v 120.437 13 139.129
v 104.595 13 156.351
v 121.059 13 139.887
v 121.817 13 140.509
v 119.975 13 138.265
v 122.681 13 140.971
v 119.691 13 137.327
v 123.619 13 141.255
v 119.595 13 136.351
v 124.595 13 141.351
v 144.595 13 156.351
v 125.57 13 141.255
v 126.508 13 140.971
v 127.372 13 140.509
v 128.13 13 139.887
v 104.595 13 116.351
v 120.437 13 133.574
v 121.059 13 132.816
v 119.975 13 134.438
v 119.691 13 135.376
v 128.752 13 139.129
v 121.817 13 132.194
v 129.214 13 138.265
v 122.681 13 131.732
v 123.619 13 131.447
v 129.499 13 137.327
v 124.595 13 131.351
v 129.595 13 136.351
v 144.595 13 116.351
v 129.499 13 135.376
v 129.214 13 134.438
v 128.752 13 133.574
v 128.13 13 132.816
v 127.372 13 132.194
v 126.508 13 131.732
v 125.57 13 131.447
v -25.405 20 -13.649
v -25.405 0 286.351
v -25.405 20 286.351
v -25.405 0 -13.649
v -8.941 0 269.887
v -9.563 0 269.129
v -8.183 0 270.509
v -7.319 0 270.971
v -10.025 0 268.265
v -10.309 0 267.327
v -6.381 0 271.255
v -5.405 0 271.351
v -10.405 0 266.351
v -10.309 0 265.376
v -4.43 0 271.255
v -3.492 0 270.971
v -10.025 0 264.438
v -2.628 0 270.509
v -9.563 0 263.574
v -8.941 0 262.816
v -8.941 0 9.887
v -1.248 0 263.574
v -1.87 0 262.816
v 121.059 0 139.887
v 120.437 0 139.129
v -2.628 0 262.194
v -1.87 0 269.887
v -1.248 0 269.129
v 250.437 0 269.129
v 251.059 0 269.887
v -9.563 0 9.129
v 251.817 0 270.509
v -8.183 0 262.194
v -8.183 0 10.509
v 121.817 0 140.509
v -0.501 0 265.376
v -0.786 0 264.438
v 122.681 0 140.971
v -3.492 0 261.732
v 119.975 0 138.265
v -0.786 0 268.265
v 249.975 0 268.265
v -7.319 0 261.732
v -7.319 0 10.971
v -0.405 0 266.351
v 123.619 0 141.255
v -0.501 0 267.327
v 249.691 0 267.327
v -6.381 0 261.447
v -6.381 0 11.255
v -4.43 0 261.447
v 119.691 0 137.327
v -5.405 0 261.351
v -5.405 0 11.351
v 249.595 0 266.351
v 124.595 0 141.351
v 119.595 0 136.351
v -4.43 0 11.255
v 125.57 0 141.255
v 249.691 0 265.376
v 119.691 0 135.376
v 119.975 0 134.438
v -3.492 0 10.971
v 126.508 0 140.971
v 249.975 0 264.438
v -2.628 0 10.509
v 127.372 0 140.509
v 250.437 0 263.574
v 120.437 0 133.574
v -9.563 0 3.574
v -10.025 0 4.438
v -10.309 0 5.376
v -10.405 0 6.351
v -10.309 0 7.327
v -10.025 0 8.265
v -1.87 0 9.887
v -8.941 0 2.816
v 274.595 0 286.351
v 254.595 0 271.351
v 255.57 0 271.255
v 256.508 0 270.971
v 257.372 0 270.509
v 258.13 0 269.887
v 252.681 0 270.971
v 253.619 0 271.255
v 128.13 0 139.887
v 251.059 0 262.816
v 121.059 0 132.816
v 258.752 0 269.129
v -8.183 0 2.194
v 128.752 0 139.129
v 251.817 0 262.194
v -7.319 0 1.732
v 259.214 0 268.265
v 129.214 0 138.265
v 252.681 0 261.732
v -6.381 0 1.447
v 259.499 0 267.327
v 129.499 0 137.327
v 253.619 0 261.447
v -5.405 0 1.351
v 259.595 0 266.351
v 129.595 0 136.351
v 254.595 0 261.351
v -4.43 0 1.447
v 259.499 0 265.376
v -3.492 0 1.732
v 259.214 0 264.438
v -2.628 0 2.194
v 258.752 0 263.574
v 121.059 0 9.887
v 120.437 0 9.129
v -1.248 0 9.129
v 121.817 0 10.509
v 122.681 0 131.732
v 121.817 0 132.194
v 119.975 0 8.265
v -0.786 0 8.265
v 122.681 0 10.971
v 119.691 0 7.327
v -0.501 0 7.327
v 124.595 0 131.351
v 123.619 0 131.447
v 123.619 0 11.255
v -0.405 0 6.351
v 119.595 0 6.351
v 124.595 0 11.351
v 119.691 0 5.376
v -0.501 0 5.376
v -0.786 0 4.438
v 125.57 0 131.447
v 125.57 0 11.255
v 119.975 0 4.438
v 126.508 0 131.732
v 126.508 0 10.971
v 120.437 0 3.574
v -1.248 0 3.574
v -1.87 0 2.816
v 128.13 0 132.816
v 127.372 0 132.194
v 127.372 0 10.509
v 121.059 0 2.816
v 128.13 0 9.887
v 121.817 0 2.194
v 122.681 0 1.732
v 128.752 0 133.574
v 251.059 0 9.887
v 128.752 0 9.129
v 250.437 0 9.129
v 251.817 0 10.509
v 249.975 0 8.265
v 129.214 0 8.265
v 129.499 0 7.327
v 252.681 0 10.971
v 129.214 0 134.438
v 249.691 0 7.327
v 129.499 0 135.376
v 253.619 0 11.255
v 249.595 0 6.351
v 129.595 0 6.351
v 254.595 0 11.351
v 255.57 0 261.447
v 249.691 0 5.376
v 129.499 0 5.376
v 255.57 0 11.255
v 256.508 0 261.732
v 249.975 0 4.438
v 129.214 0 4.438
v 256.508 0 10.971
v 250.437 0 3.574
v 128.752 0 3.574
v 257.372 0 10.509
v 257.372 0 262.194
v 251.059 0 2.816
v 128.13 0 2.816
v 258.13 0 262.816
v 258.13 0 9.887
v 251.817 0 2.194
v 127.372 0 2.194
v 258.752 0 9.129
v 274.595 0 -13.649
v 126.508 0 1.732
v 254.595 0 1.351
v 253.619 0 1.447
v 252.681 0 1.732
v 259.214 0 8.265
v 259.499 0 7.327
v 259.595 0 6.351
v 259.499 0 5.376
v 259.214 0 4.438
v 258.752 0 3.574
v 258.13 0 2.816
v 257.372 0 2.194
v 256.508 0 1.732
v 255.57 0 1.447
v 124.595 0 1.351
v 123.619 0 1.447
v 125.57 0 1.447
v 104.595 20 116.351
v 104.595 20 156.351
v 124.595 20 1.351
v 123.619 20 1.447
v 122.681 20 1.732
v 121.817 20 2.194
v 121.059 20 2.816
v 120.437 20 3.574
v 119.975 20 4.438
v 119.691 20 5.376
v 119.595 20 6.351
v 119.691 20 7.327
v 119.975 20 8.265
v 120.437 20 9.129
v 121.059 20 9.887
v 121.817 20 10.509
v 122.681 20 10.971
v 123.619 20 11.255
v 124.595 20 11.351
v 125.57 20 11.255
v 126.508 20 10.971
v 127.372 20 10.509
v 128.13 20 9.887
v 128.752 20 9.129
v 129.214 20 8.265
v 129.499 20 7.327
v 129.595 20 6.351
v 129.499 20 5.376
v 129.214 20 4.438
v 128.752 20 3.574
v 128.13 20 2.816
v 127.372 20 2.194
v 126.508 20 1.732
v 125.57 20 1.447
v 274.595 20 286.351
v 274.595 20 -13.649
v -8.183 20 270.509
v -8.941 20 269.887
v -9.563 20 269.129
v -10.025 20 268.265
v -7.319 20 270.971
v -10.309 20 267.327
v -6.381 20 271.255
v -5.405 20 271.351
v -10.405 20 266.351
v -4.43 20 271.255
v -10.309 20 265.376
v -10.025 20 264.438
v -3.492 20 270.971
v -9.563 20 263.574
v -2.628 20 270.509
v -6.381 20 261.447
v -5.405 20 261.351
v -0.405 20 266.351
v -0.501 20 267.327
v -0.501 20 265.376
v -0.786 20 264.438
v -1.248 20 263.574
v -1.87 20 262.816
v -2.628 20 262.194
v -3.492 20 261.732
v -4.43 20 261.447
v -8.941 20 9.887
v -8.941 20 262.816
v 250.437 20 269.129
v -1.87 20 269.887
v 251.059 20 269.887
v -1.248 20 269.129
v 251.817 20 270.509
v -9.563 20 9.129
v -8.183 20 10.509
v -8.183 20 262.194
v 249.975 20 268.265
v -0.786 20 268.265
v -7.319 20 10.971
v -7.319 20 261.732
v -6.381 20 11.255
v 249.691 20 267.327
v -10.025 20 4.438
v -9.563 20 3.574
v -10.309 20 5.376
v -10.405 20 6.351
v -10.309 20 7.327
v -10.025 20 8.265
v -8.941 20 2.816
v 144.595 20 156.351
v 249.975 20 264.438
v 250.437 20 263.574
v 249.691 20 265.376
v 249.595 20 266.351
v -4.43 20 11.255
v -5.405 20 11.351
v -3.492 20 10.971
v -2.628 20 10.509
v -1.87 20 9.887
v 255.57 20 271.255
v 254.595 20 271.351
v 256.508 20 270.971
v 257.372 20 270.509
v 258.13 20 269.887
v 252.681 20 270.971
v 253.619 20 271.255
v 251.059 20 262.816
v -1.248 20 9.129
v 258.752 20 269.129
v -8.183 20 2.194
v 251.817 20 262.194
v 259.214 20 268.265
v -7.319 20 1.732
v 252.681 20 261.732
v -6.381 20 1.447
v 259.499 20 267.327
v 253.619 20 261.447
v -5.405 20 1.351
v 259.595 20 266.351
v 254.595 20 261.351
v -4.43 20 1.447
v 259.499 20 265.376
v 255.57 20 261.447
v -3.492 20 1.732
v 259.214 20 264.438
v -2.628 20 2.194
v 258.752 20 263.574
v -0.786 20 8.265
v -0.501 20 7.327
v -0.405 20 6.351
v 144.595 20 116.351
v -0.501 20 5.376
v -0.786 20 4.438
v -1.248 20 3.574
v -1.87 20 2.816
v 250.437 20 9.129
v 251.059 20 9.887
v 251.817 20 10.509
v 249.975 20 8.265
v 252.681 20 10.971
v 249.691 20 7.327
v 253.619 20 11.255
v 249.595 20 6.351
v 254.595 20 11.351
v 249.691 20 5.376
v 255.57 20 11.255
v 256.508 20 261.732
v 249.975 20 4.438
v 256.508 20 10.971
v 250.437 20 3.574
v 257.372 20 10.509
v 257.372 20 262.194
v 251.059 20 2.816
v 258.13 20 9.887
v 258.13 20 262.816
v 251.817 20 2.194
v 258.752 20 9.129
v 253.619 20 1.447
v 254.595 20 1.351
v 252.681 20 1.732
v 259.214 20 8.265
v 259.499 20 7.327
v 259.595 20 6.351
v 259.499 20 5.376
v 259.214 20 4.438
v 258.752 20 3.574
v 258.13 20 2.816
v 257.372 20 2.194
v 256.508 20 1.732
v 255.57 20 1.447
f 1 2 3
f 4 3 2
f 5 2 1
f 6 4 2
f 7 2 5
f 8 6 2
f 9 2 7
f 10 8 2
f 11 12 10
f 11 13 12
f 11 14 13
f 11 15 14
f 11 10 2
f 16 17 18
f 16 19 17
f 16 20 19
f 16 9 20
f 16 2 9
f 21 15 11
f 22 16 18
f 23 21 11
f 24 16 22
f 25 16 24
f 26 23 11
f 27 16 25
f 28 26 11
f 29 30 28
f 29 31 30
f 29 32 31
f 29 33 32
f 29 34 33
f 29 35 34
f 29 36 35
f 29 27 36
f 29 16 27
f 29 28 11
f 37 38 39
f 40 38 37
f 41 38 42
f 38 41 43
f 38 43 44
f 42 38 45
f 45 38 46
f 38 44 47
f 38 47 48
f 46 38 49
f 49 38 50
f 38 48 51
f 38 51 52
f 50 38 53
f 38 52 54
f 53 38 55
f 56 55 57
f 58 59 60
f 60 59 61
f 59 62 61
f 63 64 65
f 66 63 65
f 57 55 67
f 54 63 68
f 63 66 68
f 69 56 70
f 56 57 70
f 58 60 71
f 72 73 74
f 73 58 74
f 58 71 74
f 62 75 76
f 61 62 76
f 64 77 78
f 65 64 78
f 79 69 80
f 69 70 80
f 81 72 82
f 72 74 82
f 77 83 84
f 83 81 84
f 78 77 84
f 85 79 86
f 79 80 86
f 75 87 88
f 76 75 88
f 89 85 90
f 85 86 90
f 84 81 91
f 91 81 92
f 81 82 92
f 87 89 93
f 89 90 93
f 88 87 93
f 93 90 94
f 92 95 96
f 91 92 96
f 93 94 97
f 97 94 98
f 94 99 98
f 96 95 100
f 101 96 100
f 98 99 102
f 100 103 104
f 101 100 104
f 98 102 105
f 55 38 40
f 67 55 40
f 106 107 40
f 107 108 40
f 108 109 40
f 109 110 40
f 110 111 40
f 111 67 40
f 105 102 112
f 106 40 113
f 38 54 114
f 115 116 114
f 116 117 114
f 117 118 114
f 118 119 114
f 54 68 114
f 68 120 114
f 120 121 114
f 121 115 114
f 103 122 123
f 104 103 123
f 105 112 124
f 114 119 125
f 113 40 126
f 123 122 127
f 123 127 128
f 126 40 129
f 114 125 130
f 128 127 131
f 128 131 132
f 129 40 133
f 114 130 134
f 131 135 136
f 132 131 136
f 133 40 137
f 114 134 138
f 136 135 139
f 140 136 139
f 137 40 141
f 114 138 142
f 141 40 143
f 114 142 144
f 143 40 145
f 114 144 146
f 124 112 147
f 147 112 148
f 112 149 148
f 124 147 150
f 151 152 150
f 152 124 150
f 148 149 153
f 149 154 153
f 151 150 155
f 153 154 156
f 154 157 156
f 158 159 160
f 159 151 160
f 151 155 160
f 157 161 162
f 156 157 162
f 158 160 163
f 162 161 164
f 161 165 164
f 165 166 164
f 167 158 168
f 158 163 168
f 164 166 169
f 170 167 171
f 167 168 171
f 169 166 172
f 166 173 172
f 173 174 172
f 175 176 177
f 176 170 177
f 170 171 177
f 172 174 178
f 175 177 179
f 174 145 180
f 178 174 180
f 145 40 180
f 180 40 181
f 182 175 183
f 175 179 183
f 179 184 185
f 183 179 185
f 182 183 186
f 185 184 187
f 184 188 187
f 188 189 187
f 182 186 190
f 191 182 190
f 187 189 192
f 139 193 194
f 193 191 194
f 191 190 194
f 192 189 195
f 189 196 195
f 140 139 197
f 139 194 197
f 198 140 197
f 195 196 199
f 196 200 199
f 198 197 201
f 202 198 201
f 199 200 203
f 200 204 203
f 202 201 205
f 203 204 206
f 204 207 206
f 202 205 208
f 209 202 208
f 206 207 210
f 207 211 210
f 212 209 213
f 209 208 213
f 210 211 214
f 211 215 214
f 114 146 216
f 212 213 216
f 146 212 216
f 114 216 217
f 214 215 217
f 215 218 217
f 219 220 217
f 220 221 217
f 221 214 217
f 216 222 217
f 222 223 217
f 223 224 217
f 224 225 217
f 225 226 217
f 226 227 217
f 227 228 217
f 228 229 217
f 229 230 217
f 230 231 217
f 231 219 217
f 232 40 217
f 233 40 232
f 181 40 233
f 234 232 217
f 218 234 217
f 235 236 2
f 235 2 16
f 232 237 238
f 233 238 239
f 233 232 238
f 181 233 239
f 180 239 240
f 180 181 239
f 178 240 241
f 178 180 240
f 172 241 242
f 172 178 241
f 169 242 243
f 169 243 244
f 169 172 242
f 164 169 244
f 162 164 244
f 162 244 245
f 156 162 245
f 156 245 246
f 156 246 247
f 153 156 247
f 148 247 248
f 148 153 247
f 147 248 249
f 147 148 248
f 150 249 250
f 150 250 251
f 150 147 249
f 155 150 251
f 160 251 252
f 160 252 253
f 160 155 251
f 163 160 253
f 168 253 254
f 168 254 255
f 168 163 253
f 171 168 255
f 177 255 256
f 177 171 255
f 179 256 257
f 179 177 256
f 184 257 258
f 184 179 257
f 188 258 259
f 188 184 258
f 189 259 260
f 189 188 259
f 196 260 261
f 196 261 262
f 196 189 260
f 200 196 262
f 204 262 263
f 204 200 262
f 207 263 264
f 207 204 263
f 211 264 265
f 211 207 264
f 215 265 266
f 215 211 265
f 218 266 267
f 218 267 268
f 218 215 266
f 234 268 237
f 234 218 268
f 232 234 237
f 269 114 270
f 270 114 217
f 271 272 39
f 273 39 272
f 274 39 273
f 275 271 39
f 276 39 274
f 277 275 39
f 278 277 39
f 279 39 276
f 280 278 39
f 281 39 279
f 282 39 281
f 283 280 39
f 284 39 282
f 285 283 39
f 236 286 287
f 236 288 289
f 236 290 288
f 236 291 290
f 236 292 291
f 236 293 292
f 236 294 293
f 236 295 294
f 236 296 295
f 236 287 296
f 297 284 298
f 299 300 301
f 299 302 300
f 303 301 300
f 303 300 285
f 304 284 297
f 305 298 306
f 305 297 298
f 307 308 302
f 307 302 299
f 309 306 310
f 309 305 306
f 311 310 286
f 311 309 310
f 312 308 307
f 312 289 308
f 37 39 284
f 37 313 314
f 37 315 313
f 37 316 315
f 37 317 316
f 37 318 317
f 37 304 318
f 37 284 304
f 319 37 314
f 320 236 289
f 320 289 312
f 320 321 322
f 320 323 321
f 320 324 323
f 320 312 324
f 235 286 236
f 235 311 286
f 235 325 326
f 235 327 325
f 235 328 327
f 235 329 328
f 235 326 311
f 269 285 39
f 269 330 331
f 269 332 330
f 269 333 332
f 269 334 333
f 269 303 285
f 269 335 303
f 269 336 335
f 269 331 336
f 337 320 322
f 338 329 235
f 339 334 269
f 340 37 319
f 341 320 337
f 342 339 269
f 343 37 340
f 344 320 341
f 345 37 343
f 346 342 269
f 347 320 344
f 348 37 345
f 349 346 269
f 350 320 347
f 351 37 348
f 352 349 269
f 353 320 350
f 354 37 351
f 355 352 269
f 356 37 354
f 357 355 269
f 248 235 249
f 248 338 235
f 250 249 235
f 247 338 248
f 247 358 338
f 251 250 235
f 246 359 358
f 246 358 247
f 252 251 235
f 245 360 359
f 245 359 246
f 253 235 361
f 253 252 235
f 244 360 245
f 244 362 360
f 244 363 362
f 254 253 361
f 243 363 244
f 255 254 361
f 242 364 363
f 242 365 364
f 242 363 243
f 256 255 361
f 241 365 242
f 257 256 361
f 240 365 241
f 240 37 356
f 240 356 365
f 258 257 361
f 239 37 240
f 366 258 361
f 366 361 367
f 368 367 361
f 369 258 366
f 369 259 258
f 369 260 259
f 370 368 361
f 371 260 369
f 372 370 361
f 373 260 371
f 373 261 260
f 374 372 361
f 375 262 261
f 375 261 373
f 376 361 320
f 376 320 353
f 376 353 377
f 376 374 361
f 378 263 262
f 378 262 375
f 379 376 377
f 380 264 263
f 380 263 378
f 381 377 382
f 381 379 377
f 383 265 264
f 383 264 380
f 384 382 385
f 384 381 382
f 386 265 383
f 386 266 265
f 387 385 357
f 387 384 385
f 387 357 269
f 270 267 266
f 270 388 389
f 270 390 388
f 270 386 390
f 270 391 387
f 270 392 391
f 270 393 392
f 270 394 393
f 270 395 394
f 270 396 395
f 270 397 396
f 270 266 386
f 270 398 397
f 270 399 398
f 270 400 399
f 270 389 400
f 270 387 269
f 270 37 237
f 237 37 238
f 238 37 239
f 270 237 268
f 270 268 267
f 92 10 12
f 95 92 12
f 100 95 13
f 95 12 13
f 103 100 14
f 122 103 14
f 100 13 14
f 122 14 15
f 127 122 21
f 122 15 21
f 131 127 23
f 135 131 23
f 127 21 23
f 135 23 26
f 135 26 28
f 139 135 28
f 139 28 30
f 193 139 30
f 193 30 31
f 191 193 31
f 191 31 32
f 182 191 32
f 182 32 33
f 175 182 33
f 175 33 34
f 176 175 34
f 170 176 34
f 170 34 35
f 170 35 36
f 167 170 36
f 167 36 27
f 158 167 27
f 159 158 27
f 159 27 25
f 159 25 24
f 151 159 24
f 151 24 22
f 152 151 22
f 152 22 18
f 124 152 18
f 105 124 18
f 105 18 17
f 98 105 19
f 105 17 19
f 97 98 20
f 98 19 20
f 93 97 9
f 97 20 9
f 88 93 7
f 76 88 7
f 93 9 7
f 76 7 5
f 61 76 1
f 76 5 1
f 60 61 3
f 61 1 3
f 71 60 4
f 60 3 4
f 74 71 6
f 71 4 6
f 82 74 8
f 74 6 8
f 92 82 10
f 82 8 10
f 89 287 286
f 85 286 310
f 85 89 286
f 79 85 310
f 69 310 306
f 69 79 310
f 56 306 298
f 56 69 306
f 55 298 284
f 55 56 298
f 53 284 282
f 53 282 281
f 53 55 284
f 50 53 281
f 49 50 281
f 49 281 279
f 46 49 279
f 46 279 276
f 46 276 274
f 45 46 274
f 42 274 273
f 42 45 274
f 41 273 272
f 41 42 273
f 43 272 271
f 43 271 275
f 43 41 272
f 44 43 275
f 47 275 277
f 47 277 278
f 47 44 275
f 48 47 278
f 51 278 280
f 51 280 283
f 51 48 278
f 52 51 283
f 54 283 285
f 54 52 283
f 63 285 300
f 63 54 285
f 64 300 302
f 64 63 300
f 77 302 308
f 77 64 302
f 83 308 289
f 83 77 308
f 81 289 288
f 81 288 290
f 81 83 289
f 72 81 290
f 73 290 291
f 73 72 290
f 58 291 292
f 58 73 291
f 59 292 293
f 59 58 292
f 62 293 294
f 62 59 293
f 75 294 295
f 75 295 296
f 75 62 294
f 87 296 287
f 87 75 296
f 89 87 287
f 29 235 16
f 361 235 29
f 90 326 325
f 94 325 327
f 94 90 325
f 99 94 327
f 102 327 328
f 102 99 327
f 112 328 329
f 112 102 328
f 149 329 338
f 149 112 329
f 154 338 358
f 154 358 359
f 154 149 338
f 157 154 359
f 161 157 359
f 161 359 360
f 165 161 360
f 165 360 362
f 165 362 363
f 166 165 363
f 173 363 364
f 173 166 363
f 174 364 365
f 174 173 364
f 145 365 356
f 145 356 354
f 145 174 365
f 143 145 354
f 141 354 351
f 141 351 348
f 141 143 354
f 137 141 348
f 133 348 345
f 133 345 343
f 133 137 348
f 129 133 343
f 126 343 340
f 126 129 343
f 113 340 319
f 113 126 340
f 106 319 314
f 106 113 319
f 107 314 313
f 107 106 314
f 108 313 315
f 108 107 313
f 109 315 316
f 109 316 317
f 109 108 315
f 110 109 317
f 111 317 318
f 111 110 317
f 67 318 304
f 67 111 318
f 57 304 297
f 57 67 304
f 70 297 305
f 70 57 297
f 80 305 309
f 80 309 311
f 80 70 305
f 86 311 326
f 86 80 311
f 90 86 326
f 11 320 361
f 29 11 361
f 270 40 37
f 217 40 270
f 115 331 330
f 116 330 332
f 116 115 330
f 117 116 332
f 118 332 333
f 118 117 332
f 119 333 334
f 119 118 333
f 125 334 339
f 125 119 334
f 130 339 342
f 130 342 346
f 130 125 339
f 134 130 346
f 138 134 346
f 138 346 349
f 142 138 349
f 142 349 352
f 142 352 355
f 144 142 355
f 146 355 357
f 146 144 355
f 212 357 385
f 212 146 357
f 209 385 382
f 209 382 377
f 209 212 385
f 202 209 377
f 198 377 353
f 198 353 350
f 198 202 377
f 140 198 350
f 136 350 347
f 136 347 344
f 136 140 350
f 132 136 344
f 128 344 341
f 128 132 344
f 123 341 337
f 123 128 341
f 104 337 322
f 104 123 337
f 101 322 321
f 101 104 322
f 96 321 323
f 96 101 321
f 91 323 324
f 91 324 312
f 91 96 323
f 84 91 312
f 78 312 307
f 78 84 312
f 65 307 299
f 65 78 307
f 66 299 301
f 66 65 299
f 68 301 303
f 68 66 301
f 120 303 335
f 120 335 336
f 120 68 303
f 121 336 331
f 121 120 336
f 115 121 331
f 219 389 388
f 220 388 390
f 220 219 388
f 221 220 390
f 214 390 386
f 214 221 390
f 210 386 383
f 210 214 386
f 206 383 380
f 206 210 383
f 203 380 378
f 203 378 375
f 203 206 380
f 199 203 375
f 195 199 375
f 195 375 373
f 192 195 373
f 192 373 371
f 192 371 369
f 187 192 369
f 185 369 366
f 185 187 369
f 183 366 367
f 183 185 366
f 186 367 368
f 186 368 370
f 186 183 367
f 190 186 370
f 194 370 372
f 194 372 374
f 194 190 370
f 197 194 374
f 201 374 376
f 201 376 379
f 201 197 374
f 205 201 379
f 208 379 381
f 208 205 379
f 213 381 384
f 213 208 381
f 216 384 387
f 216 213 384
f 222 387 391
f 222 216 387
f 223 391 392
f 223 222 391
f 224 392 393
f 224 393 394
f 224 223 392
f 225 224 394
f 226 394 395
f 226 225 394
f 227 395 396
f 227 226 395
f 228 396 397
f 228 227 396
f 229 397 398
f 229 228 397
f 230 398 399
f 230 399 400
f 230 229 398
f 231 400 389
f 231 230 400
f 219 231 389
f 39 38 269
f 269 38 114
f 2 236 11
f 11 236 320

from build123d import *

# Parameters (mm, degrees)
ESBO_O1_W                = 300
ESBO_O1_H                = 300
ESBO_O1_R                = 5
RESSALTO_EXTRUS_O1_DEPTH = 20
ESBO_O2_W                = 40
ESBO_O2_H                = 40
CORTE_EXTRUS_O1_DEPTH    = 7
ESBO_O3_R                = 5
CORTE_EXTRUS_O2_DEPTH    = 397.948721879


with BuildPart() as part:
    # Esboço1 → Ressalto-extrusão1 (new body)
    with BuildSketch(Plane(origin=(0, 0, 0), x_dir=(1, 0, 0), z_dir=(0, 1, 0))):
        with Locations((124.594594595, -136.351351351)):
            Rectangle(ESBO_O1_W, ESBO_O1_H)
        with Locations(Location((-5.405405405, -6.351351351, 0), (0, 0, 270))):
            Circle(ESBO_O1_R, mode=Mode.SUBTRACT)
        with Locations(Location((254.594594595, -6.351351351, 0), (0, 0, 90))):
            Circle(ESBO_O1_R, mode=Mode.SUBTRACT)
        with Locations(Location((254.594594595, -266.351351351, 0), (0, 0, 270))):
            Circle(ESBO_O1_R, mode=Mode.SUBTRACT)
        with Locations(Location((-5.405405405, -266.351351351, 0), (0, 0, 90))):
            Circle(ESBO_O1_R, mode=Mode.SUBTRACT)
        with Locations(Location((124.594594595, -6.351351351, 0), (0, 0, 90))):
            Circle(ESBO_O1_R, mode=Mode.SUBTRACT)
    extrude(amount=RESSALTO_EXTRUS_O1_DEPTH)

    # Esboço2 → Corte-extrusão1 (cut)
    with BuildSketch(Plane(origin=(0, 20, 0), x_dir=(1, 0, 0), z_dir=(0, 1, 0))):
        with Locations((124.594594595, -136.351351351)):
            Rectangle(ESBO_O2_W, ESBO_O2_H)
    extrude(amount=-CORTE_EXTRUS_O1_DEPTH, mode=Mode.SUBTRACT)

    # Esboço3 → Corte-extrusão2 (cut, through all)
    with BuildSketch(Plane(origin=(0, 13, 0), x_dir=(1, 0, 0), z_dir=(0, 1, 0))):
        with Locations(Location((124.594594595, -136.351351351, 0), (0, 0, 270))):
            Circle(ESBO_O3_R)
    extrude(amount=-CORTE_EXTRUS_O2_DEPTH, mode=Mode.SUBTRACT)


solid = part.part
